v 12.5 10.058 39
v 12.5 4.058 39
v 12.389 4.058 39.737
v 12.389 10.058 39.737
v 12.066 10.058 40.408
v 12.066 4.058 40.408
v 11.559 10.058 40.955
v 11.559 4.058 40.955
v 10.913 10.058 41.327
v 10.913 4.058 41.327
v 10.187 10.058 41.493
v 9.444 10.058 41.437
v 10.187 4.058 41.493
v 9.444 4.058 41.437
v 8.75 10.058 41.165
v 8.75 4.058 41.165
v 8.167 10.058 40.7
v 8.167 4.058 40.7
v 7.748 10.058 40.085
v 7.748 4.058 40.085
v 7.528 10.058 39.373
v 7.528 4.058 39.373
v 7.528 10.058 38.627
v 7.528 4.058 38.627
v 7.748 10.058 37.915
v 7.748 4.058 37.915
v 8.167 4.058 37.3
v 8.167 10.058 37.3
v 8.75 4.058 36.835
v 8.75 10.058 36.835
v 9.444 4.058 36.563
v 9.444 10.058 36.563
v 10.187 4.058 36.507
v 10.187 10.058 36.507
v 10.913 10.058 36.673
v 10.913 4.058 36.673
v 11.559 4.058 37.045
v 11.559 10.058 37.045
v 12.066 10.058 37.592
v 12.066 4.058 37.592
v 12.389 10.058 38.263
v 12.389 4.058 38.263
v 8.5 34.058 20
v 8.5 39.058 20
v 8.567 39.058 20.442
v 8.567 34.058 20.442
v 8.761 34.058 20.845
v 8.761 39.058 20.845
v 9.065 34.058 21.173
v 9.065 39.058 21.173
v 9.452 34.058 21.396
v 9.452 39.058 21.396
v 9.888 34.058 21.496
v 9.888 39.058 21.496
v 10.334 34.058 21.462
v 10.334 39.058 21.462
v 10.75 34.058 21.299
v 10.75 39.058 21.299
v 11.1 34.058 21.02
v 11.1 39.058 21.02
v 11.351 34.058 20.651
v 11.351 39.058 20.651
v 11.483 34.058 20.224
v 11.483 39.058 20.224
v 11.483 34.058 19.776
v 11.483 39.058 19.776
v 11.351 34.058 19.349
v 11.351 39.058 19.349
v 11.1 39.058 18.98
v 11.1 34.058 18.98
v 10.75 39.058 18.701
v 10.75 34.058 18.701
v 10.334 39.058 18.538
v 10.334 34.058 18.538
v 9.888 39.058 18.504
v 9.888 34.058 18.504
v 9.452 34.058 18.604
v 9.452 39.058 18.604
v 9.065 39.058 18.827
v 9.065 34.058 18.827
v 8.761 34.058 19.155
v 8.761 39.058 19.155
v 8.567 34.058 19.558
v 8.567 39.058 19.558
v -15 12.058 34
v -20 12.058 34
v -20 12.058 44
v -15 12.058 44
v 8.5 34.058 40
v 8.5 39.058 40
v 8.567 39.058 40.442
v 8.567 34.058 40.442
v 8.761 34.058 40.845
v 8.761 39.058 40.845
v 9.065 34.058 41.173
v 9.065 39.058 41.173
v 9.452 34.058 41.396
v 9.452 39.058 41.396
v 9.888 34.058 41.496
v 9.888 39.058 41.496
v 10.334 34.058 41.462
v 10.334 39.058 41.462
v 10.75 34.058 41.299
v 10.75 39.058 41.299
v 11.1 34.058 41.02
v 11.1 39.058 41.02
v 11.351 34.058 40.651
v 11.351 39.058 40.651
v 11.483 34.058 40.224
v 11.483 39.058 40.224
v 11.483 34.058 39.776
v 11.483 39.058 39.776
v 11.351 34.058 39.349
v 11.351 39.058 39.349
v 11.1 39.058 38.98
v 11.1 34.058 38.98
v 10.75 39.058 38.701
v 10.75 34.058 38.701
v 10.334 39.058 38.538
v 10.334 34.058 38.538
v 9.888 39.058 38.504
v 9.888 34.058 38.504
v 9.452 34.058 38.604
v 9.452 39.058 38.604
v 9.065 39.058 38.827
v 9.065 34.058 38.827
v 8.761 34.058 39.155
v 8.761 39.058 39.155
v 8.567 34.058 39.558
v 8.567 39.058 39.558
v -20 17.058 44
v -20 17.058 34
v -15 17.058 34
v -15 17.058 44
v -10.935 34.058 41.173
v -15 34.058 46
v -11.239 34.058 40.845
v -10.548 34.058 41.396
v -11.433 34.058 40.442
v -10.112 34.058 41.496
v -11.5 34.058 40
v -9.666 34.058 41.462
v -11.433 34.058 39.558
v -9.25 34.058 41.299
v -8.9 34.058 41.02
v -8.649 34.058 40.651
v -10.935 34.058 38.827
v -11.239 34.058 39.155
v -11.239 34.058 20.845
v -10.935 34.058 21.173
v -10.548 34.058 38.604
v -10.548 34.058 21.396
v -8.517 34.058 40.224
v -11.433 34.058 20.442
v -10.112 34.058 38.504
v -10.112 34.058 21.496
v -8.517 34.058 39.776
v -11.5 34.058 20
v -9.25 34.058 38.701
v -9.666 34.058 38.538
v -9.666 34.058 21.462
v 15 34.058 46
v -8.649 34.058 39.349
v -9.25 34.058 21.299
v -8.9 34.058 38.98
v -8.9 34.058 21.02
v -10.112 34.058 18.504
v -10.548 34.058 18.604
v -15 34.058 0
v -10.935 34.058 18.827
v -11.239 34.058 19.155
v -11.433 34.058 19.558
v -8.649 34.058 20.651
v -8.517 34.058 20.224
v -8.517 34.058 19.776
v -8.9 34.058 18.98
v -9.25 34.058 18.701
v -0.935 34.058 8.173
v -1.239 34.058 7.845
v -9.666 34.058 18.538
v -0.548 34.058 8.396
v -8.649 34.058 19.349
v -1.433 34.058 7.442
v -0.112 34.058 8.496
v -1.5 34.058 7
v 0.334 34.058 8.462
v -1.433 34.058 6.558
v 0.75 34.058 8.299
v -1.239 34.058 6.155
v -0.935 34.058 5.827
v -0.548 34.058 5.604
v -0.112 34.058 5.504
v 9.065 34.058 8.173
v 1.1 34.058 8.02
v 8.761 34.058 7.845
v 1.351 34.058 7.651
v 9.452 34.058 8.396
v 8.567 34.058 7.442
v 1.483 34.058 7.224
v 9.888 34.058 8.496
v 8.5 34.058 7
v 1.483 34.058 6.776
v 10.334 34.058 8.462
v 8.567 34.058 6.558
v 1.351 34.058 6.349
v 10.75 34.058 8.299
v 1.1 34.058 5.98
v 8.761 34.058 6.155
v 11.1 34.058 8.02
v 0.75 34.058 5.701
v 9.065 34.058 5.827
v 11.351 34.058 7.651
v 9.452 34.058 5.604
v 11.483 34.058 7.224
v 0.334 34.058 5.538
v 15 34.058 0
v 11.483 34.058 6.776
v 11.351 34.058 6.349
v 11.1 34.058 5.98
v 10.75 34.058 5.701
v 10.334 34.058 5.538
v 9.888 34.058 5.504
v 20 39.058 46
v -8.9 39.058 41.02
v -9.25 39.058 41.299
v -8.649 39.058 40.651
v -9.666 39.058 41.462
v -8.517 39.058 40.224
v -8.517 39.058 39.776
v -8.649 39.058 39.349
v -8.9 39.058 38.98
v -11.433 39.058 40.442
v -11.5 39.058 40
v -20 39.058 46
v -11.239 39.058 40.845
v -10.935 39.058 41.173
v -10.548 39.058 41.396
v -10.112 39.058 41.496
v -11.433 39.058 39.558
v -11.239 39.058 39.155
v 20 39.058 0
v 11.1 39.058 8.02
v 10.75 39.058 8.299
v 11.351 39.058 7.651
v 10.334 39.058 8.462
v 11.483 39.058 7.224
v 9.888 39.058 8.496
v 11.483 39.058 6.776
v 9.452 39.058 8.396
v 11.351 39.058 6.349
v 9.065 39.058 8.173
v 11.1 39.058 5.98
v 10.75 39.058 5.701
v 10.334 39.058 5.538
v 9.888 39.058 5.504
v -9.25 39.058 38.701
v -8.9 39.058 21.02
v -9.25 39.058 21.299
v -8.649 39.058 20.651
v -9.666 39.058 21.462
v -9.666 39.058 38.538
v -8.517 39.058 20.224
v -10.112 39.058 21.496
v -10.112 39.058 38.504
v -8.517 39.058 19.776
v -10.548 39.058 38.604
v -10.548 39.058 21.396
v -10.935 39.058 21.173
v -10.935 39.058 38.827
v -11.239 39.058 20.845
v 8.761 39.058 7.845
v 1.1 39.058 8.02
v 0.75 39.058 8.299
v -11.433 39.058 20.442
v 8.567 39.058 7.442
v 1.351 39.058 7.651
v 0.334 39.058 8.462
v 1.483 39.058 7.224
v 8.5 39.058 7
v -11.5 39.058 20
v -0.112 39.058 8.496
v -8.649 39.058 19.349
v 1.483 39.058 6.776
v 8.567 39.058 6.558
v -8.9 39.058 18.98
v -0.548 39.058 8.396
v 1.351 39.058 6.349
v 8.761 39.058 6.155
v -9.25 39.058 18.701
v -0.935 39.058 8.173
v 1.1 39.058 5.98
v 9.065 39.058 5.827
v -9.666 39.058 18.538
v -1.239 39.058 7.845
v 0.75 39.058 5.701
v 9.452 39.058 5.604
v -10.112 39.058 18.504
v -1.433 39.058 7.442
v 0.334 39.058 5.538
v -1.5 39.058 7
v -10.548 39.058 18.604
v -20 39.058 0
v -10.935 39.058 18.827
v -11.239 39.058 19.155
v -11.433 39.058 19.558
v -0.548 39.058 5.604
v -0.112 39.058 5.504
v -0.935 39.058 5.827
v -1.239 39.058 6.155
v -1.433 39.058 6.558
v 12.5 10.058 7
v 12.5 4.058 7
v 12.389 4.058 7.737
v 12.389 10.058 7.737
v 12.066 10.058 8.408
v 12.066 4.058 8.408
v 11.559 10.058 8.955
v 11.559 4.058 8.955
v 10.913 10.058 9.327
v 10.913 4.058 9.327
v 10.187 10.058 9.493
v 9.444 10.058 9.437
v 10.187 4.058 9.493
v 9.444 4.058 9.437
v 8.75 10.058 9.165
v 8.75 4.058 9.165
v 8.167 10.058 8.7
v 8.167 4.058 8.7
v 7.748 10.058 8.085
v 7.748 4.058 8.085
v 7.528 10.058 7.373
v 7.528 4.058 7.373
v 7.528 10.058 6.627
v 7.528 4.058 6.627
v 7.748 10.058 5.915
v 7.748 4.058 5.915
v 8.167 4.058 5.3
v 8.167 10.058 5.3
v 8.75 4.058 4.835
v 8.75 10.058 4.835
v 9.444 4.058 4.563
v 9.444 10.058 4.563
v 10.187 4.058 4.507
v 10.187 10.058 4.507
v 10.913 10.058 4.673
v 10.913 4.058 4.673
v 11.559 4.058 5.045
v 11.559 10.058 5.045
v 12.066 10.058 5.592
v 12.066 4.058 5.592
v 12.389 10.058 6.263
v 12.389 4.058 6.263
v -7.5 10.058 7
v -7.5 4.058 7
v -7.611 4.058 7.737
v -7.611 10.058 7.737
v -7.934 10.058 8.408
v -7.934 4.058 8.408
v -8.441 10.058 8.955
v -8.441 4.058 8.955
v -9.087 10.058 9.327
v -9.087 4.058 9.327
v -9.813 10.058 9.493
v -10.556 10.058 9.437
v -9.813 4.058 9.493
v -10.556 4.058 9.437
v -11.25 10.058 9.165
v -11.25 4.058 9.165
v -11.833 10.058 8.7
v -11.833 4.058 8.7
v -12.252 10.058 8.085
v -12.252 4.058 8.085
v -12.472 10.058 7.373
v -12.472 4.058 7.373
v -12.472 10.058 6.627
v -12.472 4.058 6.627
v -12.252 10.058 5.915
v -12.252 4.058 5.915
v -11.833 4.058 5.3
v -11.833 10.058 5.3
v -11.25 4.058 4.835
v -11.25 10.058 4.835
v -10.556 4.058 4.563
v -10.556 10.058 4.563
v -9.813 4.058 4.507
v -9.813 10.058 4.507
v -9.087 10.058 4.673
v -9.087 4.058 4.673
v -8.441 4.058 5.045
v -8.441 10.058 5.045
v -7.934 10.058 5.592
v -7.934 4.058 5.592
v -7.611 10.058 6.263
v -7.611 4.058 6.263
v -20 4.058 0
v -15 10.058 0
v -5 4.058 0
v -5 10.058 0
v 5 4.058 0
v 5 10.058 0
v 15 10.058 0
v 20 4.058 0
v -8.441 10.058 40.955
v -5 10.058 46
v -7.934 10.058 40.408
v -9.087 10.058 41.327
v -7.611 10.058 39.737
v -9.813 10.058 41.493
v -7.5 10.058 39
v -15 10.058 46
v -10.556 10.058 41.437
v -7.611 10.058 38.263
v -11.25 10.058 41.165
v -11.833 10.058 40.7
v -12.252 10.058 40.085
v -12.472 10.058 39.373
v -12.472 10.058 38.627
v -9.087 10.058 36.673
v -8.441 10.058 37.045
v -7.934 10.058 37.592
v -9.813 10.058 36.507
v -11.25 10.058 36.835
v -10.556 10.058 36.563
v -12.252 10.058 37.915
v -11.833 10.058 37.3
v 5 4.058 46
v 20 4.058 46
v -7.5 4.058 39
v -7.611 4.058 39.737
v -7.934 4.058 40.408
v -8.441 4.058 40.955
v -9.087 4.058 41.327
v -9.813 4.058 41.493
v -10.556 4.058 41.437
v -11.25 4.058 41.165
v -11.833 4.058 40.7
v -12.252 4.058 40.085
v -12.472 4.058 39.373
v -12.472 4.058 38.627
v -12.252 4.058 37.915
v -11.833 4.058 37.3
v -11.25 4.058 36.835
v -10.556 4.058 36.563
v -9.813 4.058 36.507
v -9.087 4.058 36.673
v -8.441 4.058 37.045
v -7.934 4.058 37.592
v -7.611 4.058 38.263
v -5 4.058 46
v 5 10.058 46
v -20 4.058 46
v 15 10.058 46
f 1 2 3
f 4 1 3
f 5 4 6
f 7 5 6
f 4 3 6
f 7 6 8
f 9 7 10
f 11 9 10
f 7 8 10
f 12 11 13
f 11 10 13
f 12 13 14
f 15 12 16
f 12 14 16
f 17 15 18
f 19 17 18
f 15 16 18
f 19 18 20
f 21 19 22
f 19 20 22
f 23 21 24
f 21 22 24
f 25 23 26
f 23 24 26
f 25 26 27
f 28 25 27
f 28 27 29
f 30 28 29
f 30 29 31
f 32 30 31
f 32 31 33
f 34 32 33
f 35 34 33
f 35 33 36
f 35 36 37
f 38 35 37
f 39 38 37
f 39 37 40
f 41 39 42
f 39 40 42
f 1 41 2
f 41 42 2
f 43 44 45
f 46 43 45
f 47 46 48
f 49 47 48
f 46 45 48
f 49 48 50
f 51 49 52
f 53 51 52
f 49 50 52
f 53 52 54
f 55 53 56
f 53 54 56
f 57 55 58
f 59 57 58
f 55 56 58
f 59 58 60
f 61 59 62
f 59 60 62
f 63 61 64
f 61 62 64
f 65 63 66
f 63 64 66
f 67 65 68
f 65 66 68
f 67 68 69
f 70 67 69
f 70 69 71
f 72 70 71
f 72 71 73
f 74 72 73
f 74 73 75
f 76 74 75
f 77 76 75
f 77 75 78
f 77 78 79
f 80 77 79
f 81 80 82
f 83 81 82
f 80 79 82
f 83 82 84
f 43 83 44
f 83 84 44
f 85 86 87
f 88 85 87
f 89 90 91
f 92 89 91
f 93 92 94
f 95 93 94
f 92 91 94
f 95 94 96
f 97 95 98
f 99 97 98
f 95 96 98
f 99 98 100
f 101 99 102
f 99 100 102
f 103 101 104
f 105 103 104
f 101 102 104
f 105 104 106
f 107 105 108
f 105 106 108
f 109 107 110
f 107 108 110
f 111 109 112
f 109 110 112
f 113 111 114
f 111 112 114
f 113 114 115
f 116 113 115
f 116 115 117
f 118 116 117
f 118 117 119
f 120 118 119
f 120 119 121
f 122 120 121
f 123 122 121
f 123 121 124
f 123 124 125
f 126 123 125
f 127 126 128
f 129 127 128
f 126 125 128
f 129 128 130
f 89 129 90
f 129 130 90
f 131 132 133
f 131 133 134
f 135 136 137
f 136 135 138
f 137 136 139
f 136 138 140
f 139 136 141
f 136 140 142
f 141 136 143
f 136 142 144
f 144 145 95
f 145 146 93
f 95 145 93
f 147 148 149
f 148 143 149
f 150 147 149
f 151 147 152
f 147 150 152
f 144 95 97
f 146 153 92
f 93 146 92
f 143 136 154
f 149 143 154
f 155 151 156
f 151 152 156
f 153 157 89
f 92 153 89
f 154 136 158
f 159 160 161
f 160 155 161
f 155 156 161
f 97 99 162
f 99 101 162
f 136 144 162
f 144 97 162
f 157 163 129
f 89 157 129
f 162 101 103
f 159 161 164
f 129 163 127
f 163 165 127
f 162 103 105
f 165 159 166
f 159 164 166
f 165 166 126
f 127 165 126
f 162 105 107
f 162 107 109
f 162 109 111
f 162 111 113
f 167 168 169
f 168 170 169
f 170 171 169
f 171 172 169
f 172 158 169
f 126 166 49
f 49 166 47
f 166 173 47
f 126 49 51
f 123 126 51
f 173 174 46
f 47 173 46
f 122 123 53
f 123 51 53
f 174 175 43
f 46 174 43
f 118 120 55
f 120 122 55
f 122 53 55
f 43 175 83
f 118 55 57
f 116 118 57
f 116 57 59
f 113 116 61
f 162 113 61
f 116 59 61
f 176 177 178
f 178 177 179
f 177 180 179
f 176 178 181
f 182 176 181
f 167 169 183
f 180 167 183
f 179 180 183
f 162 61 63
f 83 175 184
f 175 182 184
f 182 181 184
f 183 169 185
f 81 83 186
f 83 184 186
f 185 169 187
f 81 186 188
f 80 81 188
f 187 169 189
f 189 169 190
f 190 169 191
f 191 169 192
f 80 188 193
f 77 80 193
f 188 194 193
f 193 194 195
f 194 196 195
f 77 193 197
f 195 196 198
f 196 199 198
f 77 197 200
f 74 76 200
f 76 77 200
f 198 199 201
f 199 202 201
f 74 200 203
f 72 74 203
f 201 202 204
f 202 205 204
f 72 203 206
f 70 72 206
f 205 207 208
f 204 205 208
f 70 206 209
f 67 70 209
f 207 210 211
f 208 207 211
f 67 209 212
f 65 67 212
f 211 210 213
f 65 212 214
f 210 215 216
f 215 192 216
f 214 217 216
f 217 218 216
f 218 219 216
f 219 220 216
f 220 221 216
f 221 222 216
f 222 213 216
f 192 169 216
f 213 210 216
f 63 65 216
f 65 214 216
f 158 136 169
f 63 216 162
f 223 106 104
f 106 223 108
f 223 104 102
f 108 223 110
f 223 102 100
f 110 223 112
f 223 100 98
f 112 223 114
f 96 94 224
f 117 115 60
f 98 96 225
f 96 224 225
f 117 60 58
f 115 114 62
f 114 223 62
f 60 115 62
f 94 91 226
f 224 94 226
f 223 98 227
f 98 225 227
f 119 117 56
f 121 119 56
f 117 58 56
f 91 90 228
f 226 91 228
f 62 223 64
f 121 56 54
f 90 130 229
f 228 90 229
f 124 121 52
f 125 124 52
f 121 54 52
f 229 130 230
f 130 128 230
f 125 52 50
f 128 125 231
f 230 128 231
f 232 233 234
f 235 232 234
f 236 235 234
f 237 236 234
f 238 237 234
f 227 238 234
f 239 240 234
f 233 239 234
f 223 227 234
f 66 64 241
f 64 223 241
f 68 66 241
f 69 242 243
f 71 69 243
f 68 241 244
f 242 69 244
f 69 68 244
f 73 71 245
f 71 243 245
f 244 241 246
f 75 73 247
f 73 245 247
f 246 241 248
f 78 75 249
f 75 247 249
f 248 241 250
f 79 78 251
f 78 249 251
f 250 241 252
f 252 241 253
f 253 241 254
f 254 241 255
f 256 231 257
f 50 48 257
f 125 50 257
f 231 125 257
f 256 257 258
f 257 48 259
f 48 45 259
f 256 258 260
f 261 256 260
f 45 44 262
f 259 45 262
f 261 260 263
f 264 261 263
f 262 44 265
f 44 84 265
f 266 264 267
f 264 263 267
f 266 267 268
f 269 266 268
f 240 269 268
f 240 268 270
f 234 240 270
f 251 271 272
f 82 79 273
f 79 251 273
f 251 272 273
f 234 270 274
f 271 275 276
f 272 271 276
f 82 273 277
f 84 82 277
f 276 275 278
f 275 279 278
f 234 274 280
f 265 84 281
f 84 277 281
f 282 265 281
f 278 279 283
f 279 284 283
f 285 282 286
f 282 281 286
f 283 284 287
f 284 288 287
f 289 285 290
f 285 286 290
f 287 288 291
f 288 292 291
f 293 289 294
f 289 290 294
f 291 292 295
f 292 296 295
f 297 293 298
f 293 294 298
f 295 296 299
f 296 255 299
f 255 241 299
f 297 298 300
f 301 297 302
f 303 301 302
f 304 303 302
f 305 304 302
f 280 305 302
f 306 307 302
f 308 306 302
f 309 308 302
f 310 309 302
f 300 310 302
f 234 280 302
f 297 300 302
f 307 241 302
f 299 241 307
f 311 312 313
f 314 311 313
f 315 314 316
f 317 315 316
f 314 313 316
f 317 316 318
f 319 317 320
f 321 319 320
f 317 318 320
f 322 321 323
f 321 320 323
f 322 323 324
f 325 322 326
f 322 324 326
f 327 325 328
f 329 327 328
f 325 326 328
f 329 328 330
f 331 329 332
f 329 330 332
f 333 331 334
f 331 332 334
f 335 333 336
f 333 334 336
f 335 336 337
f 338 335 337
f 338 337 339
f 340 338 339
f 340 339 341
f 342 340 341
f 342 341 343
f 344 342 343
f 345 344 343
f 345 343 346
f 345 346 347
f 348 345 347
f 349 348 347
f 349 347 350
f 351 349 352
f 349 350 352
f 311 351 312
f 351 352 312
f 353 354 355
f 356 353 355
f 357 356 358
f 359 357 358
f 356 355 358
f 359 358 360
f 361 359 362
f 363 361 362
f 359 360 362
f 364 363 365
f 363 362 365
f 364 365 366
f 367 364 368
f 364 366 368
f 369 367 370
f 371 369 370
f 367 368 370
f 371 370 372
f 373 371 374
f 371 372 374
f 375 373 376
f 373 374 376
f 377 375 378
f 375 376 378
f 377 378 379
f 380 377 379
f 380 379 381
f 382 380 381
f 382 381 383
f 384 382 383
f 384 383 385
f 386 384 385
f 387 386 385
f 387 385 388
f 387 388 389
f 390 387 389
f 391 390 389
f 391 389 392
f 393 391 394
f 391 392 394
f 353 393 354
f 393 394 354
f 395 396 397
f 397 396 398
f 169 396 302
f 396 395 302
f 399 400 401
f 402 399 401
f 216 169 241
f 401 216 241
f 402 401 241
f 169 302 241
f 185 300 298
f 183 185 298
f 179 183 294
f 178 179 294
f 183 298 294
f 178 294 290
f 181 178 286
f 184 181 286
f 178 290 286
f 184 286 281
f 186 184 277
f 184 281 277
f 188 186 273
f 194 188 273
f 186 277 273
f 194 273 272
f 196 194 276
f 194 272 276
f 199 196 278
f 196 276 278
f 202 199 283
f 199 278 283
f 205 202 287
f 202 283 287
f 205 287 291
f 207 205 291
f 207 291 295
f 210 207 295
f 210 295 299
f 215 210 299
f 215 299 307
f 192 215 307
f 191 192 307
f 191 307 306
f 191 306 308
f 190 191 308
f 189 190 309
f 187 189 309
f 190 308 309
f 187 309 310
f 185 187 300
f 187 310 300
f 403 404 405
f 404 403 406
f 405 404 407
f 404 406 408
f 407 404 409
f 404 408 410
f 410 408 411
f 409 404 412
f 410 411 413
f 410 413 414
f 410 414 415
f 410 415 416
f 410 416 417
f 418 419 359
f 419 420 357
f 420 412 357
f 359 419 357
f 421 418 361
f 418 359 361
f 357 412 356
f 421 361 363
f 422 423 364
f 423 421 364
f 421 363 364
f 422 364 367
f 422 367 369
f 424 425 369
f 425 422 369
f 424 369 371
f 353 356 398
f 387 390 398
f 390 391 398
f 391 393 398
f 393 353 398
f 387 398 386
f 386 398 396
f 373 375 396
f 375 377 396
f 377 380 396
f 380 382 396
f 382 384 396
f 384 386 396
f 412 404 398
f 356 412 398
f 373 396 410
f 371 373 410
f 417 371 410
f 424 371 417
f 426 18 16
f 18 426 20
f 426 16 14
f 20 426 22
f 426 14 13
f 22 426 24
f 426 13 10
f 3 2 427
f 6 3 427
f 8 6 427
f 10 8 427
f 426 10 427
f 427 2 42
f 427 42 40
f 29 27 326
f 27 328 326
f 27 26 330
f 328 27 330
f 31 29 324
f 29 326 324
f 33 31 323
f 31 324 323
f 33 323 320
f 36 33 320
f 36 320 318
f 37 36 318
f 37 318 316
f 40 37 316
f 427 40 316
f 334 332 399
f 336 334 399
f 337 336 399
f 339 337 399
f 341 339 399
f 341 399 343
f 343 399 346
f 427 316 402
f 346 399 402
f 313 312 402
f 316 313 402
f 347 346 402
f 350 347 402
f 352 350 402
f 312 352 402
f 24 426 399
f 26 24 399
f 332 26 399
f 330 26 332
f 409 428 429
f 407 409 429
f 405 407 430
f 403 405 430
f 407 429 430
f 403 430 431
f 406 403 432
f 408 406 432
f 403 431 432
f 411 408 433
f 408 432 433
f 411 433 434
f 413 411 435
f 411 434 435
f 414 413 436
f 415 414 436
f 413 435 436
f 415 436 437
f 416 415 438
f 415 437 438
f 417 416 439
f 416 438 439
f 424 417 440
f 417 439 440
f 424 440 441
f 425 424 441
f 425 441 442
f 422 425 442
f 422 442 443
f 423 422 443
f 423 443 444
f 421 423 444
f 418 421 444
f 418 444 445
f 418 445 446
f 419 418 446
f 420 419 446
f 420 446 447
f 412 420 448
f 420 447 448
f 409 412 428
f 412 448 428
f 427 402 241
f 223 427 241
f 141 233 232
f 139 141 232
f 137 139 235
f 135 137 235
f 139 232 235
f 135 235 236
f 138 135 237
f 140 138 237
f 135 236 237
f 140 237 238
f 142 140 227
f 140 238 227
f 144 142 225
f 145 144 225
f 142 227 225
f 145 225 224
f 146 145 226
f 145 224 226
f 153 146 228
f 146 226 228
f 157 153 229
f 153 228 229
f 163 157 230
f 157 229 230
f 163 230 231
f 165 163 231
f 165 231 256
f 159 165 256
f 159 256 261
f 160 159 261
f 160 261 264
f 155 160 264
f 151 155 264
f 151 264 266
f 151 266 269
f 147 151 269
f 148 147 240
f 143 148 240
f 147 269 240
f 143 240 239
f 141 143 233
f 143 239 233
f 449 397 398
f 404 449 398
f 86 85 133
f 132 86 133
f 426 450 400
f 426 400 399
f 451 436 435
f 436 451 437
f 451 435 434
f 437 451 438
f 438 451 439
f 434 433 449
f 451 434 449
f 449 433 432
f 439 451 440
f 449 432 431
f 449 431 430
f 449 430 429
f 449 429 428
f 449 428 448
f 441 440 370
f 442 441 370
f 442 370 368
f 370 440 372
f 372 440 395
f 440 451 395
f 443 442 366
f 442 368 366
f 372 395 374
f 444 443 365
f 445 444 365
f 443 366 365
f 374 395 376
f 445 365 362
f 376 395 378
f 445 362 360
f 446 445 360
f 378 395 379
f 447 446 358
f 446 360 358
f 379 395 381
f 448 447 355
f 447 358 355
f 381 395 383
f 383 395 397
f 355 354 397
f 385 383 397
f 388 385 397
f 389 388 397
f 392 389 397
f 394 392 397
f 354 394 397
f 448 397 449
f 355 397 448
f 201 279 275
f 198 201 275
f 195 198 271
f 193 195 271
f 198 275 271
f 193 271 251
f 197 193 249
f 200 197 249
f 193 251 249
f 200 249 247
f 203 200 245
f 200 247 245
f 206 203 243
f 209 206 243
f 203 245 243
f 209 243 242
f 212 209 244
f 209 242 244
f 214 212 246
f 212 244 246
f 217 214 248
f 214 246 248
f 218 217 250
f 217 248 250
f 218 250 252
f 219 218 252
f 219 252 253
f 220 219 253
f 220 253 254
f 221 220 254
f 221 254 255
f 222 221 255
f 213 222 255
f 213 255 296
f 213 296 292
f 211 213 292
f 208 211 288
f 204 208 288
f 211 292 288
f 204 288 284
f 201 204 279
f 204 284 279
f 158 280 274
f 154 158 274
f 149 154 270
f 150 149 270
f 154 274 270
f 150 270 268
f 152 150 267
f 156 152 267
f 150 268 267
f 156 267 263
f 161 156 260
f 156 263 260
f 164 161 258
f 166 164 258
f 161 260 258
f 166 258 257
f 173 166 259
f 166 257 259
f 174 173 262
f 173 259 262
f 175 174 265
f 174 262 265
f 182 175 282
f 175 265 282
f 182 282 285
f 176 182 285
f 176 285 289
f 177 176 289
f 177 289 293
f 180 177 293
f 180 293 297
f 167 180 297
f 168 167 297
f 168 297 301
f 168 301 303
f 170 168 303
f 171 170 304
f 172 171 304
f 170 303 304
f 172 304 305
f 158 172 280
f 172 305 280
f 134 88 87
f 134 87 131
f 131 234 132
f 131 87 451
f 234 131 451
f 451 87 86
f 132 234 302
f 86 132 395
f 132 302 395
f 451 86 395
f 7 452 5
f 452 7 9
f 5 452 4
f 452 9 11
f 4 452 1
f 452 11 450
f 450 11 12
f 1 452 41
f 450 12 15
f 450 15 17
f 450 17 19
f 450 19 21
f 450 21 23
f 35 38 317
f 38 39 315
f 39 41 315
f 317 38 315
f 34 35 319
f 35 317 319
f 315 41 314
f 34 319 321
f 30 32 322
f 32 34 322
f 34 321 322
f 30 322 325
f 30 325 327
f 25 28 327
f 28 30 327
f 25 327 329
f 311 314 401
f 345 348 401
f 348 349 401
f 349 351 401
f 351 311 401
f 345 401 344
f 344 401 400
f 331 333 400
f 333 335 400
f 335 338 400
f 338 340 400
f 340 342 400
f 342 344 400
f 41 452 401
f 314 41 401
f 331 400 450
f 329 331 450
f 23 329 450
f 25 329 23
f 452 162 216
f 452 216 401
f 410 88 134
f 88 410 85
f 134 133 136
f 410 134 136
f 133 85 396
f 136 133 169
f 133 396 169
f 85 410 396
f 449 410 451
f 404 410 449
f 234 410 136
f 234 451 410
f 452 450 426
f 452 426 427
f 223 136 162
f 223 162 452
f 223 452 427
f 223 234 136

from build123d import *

# Parameters (mm, degrees)
BOSS_EXTRUDE1_DEPTH = 46
SKETCH2_R           = 2.5
CUT_EXTRUDE1_DEPTH  = 6
SKETCH3_R           = 1.5
CUT_EXTRUDE2_DEPTH  = 5
SKETCH4_R           = 1.5
CUT_EXTRUDE3_DEPTH  = 5
SKETCH5_W           = 10
SKETCH5_H           = 5
CUT_EXTRUDE4_DEPTH  = 5


with BuildPart() as part:
    # Sketch1 → Boss-Extrude1 (new body)
    with BuildSketch(Plane.XY):
        Polygon((20, 39.058190014), (-20, 39.058190014), (-20, 4.058190014), (-5, 4.058190014), (-5, 10.058190014), (-15, 10.058190014), (-15, 34.058190014), (15, 34.058190014), (15, 10.058190014), (5, 10.058190014), (5, 4.058190014), (20, 4.058190014), align=None)
    extrude(amount=BOSS_EXTRUDE1_DEPTH)

    # Sketch2 → Cut-Extrude1 (cut)
    with BuildSketch(Plane(origin=(0, 4.058190014, 0), x_dir=(-1, 0, 0), z_dir=(0, -1, 0))):
        with Locations(Location((10, -39, 0), (0, 0, 180))):
            Circle(SKETCH2_R)
        with Locations(Location((-10, -39, 0), (0, 0, 180))):
            Circle(SKETCH2_R)
        with Locations(Location((-10, -7, 0), (0, 0, 180))):
            Circle(SKETCH2_R)
        with Locations(Location((10, -7, 0), (0, 0, 180))):
            Circle(SKETCH2_R)
    extrude(amount=-CUT_EXTRUDE1_DEPTH, mode=Mode.SUBTRACT)

    # Sketch3 → Cut-Extrude2 (cut)
    with BuildSketch(Plane(origin=(0, 39.058190014, 0), x_dir=(1, 0, 0), z_dir=(0, 1, 0))):
        with Locations(Location((-10, -20, 0), (0, 0, 180))):
            Circle(SKETCH3_R)
        with Locations(Location((10, -20, 0), (0, 0, 180))):
            Circle(SKETCH3_R)
        with Locations(Location((-10, -40, 0), (0, 0, 180))):
            Circle(SKETCH3_R)
        with Locations(Location((10, -40, 0), (0, 0, 180))):
            Circle(SKETCH3_R)
    extrude(amount=-CUT_EXTRUDE2_DEPTH, mode=Mode.SUBTRACT)

    # Sketch4 → Cut-Extrude3 (cut)
    with BuildSketch(Plane(origin=(0, 39.058190014, 0), x_dir=(1, 0, 0), z_dir=(0, 1, 0))):
        with Locations(Location((10, -7, 0), (0, 0, 180))):
            Circle(SKETCH4_R)
        with Locations(Location((0, -7, 0), (0, 0, 180))):
            Circle(SKETCH4_R)
    extrude(amount=-CUT_EXTRUDE3_DEPTH, mode=Mode.SUBTRACT)

    # Sketch5 → Cut-Extrude4 (cut)
    with BuildSketch(Plane.ZY.offset(20)):
        with Locations((39, 14.558190014)):
            Rectangle(SKETCH5_W, SKETCH5_H)
    extrude(amount=-CUT_EXTRUDE4_DEPTH, mode=Mode.SUBTRACT)


solid = part.part
